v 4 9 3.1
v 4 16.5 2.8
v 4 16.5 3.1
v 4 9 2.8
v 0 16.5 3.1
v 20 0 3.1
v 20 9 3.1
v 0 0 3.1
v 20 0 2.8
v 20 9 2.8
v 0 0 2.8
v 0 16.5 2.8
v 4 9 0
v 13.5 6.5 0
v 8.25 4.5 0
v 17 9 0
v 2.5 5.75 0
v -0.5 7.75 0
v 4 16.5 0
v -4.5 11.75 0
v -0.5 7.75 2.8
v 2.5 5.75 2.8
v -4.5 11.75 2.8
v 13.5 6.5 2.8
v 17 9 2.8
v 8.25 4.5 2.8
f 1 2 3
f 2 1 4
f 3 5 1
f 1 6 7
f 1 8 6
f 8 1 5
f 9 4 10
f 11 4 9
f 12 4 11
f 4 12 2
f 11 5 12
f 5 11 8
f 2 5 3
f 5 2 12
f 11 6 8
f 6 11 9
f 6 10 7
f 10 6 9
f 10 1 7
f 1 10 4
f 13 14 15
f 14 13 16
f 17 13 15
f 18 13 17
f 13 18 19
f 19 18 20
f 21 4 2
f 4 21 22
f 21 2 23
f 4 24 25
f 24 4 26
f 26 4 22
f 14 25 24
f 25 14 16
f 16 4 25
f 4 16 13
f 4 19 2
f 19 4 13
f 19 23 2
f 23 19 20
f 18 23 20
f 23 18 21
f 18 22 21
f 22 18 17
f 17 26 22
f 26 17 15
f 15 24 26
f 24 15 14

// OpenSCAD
//Spare1
l1 = 0.3; //Layer1
l2 = 2.8; //Layer2

a=4.0;
b=17;
c=20;
d=4.5;

e=7.5;
f=12;
g=16.5;
l=4.75;
m=12.75;

module plate()
{
    translate([0,0,l2])
    {
        cube([a,g,l1]);
        cube([c,g-e,l1]);
    }
}


module brokenpart()
{
    color("red")
    linear_extrude(l2)
    polygon(points=[[a,g],[0-d,g-l],[0-d+4,g-l-4],[0-d+7,g-l-6],[0-d+m,g-f],[b-3.5,g-f+2],[b,g-e],[a,g-e]]);
}

brokenpart();
plate();
